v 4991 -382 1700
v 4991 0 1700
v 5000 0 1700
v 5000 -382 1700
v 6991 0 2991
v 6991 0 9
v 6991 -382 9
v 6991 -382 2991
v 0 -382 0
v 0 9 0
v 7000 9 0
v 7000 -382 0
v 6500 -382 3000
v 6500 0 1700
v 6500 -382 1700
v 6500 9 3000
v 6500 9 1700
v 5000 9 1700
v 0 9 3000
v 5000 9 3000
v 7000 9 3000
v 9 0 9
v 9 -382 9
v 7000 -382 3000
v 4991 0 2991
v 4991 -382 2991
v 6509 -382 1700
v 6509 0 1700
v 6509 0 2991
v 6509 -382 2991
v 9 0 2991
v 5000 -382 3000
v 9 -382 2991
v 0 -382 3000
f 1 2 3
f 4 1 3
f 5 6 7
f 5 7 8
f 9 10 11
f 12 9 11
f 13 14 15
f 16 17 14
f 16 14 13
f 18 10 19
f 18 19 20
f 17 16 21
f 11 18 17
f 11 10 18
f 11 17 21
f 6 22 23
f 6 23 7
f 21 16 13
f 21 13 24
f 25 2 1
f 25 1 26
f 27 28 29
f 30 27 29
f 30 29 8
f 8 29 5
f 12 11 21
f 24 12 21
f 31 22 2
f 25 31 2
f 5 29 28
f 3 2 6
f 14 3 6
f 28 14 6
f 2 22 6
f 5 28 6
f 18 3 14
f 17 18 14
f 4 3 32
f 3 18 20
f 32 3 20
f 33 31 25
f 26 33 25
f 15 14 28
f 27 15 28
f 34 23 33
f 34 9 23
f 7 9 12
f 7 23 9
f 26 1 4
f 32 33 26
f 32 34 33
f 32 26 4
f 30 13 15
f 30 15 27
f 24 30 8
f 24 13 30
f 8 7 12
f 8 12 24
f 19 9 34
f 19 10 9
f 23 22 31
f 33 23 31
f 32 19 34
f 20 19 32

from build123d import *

# Parameters (mm, degrees)
SKETCH1_W           = 7000
SKETCH1_H           = 3000
BOSS_EXTRUDE1_DEPTH = 9
SKETCH3_W           = 1500
SKETCH3_H           = 1300
CUT_EXTRUDE1_DEPTH  = 7616.778423773
SKETCH4_W           = 5000
SKETCH4_H           = 9
BOSS_EXTRUDE2_DEPTH = 382
SKETCH5_W           = 9
SKETCH5_H           = 2991
BOSS_EXTRUDE3_DEPTH = 382
SKETCH6_W           = 6991
SKETCH6_H           = 9
BOSS_EXTRUDE4_DEPTH = 382
SKETCH7_W           = 9
SKETCH7_H           = 2991
BOSS_EXTRUDE5_DEPTH = 382
SKETCH8_W           = 491
SKETCH8_H           = 9
BOSS_EXTRUDE6_DEPTH = 382
SKETCH9_W           = 9
SKETCH9_H           = 1291
BOSS_EXTRUDE7_DEPTH = 382
SKETCH10_W          = 9
SKETCH10_H          = 1291
BOSS_EXTRUDE8_DEPTH = 382


with BuildPart() as part:
    # Sketch1 → Boss-Extrude1 (new body)
    with BuildSketch(Plane(origin=(0, 0, 0), x_dir=(1, 0, 0), z_dir=(0, 1, 0))):
        with Locations((3500, -1500)):
            Rectangle(SKETCH1_W, SKETCH1_H)
    extrude(amount=BOSS_EXTRUDE1_DEPTH)

    # Sketch3 → Cut-Extrude1 (cut, through all)
    with BuildSketch(Plane.XZ):
        with Locations((5750, 2350)):
            Rectangle(SKETCH3_W, SKETCH3_H)
    extrude(amount=-CUT_EXTRUDE1_DEPTH, mode=Mode.SUBTRACT)

    # Sketch4 → Boss-Extrude2 (add)
    with BuildSketch(Plane.XZ):
        with Locations((2500, 2995.5)):
            Rectangle(SKETCH4_W, SKETCH4_H)
    extrude(amount=BOSS_EXTRUDE2_DEPTH)

    # Sketch5 → Boss-Extrude3 (add)
    with BuildSketch(Plane.XZ):
        with Locations((4.5, 1495.5)):
            Rectangle(SKETCH5_W, SKETCH5_H)
    extrude(amount=BOSS_EXTRUDE3_DEPTH)

    # Sketch6 → Boss-Extrude4 (add)
    with BuildSketch(Plane.XZ):
        with Locations((3504.5, 4.5)):
            Rectangle(SKETCH6_W, SKETCH6_H)
    extrude(amount=BOSS_EXTRUDE4_DEPTH)

    # Sketch7 → Boss-Extrude5 (add)
    with BuildSketch(Plane.XZ):
        with Locations((6995.5, 1504.5)):
            Rectangle(SKETCH7_W, SKETCH7_H)
    extrude(amount=BOSS_EXTRUDE5_DEPTH)

    # Sketch8 → Boss-Extrude6 (add)
    with BuildSketch(Plane.XZ):
        with Locations((6745.5, 2995.5)):
            Rectangle(SKETCH8_W, SKETCH8_H)
    extrude(amount=BOSS_EXTRUDE6_DEPTH)

    # Sketch9 → Boss-Extrude7 (add)
    with BuildSketch(Plane.XZ):
        with Locations((6504.5, 2345.5)):
            Rectangle(SKETCH9_W, SKETCH9_H)
    extrude(amount=BOSS_EXTRUDE7_DEPTH)

    # Sketch10 → Boss-Extrude8 (add)
    with BuildSketch(Plane.XZ):
        with Locations((4995.5, 2345.5)):
            Rectangle(SKETCH10_W, SKETCH10_H)
    extrude(amount=BOSS_EXTRUDE8_DEPTH)


solid = part.part
